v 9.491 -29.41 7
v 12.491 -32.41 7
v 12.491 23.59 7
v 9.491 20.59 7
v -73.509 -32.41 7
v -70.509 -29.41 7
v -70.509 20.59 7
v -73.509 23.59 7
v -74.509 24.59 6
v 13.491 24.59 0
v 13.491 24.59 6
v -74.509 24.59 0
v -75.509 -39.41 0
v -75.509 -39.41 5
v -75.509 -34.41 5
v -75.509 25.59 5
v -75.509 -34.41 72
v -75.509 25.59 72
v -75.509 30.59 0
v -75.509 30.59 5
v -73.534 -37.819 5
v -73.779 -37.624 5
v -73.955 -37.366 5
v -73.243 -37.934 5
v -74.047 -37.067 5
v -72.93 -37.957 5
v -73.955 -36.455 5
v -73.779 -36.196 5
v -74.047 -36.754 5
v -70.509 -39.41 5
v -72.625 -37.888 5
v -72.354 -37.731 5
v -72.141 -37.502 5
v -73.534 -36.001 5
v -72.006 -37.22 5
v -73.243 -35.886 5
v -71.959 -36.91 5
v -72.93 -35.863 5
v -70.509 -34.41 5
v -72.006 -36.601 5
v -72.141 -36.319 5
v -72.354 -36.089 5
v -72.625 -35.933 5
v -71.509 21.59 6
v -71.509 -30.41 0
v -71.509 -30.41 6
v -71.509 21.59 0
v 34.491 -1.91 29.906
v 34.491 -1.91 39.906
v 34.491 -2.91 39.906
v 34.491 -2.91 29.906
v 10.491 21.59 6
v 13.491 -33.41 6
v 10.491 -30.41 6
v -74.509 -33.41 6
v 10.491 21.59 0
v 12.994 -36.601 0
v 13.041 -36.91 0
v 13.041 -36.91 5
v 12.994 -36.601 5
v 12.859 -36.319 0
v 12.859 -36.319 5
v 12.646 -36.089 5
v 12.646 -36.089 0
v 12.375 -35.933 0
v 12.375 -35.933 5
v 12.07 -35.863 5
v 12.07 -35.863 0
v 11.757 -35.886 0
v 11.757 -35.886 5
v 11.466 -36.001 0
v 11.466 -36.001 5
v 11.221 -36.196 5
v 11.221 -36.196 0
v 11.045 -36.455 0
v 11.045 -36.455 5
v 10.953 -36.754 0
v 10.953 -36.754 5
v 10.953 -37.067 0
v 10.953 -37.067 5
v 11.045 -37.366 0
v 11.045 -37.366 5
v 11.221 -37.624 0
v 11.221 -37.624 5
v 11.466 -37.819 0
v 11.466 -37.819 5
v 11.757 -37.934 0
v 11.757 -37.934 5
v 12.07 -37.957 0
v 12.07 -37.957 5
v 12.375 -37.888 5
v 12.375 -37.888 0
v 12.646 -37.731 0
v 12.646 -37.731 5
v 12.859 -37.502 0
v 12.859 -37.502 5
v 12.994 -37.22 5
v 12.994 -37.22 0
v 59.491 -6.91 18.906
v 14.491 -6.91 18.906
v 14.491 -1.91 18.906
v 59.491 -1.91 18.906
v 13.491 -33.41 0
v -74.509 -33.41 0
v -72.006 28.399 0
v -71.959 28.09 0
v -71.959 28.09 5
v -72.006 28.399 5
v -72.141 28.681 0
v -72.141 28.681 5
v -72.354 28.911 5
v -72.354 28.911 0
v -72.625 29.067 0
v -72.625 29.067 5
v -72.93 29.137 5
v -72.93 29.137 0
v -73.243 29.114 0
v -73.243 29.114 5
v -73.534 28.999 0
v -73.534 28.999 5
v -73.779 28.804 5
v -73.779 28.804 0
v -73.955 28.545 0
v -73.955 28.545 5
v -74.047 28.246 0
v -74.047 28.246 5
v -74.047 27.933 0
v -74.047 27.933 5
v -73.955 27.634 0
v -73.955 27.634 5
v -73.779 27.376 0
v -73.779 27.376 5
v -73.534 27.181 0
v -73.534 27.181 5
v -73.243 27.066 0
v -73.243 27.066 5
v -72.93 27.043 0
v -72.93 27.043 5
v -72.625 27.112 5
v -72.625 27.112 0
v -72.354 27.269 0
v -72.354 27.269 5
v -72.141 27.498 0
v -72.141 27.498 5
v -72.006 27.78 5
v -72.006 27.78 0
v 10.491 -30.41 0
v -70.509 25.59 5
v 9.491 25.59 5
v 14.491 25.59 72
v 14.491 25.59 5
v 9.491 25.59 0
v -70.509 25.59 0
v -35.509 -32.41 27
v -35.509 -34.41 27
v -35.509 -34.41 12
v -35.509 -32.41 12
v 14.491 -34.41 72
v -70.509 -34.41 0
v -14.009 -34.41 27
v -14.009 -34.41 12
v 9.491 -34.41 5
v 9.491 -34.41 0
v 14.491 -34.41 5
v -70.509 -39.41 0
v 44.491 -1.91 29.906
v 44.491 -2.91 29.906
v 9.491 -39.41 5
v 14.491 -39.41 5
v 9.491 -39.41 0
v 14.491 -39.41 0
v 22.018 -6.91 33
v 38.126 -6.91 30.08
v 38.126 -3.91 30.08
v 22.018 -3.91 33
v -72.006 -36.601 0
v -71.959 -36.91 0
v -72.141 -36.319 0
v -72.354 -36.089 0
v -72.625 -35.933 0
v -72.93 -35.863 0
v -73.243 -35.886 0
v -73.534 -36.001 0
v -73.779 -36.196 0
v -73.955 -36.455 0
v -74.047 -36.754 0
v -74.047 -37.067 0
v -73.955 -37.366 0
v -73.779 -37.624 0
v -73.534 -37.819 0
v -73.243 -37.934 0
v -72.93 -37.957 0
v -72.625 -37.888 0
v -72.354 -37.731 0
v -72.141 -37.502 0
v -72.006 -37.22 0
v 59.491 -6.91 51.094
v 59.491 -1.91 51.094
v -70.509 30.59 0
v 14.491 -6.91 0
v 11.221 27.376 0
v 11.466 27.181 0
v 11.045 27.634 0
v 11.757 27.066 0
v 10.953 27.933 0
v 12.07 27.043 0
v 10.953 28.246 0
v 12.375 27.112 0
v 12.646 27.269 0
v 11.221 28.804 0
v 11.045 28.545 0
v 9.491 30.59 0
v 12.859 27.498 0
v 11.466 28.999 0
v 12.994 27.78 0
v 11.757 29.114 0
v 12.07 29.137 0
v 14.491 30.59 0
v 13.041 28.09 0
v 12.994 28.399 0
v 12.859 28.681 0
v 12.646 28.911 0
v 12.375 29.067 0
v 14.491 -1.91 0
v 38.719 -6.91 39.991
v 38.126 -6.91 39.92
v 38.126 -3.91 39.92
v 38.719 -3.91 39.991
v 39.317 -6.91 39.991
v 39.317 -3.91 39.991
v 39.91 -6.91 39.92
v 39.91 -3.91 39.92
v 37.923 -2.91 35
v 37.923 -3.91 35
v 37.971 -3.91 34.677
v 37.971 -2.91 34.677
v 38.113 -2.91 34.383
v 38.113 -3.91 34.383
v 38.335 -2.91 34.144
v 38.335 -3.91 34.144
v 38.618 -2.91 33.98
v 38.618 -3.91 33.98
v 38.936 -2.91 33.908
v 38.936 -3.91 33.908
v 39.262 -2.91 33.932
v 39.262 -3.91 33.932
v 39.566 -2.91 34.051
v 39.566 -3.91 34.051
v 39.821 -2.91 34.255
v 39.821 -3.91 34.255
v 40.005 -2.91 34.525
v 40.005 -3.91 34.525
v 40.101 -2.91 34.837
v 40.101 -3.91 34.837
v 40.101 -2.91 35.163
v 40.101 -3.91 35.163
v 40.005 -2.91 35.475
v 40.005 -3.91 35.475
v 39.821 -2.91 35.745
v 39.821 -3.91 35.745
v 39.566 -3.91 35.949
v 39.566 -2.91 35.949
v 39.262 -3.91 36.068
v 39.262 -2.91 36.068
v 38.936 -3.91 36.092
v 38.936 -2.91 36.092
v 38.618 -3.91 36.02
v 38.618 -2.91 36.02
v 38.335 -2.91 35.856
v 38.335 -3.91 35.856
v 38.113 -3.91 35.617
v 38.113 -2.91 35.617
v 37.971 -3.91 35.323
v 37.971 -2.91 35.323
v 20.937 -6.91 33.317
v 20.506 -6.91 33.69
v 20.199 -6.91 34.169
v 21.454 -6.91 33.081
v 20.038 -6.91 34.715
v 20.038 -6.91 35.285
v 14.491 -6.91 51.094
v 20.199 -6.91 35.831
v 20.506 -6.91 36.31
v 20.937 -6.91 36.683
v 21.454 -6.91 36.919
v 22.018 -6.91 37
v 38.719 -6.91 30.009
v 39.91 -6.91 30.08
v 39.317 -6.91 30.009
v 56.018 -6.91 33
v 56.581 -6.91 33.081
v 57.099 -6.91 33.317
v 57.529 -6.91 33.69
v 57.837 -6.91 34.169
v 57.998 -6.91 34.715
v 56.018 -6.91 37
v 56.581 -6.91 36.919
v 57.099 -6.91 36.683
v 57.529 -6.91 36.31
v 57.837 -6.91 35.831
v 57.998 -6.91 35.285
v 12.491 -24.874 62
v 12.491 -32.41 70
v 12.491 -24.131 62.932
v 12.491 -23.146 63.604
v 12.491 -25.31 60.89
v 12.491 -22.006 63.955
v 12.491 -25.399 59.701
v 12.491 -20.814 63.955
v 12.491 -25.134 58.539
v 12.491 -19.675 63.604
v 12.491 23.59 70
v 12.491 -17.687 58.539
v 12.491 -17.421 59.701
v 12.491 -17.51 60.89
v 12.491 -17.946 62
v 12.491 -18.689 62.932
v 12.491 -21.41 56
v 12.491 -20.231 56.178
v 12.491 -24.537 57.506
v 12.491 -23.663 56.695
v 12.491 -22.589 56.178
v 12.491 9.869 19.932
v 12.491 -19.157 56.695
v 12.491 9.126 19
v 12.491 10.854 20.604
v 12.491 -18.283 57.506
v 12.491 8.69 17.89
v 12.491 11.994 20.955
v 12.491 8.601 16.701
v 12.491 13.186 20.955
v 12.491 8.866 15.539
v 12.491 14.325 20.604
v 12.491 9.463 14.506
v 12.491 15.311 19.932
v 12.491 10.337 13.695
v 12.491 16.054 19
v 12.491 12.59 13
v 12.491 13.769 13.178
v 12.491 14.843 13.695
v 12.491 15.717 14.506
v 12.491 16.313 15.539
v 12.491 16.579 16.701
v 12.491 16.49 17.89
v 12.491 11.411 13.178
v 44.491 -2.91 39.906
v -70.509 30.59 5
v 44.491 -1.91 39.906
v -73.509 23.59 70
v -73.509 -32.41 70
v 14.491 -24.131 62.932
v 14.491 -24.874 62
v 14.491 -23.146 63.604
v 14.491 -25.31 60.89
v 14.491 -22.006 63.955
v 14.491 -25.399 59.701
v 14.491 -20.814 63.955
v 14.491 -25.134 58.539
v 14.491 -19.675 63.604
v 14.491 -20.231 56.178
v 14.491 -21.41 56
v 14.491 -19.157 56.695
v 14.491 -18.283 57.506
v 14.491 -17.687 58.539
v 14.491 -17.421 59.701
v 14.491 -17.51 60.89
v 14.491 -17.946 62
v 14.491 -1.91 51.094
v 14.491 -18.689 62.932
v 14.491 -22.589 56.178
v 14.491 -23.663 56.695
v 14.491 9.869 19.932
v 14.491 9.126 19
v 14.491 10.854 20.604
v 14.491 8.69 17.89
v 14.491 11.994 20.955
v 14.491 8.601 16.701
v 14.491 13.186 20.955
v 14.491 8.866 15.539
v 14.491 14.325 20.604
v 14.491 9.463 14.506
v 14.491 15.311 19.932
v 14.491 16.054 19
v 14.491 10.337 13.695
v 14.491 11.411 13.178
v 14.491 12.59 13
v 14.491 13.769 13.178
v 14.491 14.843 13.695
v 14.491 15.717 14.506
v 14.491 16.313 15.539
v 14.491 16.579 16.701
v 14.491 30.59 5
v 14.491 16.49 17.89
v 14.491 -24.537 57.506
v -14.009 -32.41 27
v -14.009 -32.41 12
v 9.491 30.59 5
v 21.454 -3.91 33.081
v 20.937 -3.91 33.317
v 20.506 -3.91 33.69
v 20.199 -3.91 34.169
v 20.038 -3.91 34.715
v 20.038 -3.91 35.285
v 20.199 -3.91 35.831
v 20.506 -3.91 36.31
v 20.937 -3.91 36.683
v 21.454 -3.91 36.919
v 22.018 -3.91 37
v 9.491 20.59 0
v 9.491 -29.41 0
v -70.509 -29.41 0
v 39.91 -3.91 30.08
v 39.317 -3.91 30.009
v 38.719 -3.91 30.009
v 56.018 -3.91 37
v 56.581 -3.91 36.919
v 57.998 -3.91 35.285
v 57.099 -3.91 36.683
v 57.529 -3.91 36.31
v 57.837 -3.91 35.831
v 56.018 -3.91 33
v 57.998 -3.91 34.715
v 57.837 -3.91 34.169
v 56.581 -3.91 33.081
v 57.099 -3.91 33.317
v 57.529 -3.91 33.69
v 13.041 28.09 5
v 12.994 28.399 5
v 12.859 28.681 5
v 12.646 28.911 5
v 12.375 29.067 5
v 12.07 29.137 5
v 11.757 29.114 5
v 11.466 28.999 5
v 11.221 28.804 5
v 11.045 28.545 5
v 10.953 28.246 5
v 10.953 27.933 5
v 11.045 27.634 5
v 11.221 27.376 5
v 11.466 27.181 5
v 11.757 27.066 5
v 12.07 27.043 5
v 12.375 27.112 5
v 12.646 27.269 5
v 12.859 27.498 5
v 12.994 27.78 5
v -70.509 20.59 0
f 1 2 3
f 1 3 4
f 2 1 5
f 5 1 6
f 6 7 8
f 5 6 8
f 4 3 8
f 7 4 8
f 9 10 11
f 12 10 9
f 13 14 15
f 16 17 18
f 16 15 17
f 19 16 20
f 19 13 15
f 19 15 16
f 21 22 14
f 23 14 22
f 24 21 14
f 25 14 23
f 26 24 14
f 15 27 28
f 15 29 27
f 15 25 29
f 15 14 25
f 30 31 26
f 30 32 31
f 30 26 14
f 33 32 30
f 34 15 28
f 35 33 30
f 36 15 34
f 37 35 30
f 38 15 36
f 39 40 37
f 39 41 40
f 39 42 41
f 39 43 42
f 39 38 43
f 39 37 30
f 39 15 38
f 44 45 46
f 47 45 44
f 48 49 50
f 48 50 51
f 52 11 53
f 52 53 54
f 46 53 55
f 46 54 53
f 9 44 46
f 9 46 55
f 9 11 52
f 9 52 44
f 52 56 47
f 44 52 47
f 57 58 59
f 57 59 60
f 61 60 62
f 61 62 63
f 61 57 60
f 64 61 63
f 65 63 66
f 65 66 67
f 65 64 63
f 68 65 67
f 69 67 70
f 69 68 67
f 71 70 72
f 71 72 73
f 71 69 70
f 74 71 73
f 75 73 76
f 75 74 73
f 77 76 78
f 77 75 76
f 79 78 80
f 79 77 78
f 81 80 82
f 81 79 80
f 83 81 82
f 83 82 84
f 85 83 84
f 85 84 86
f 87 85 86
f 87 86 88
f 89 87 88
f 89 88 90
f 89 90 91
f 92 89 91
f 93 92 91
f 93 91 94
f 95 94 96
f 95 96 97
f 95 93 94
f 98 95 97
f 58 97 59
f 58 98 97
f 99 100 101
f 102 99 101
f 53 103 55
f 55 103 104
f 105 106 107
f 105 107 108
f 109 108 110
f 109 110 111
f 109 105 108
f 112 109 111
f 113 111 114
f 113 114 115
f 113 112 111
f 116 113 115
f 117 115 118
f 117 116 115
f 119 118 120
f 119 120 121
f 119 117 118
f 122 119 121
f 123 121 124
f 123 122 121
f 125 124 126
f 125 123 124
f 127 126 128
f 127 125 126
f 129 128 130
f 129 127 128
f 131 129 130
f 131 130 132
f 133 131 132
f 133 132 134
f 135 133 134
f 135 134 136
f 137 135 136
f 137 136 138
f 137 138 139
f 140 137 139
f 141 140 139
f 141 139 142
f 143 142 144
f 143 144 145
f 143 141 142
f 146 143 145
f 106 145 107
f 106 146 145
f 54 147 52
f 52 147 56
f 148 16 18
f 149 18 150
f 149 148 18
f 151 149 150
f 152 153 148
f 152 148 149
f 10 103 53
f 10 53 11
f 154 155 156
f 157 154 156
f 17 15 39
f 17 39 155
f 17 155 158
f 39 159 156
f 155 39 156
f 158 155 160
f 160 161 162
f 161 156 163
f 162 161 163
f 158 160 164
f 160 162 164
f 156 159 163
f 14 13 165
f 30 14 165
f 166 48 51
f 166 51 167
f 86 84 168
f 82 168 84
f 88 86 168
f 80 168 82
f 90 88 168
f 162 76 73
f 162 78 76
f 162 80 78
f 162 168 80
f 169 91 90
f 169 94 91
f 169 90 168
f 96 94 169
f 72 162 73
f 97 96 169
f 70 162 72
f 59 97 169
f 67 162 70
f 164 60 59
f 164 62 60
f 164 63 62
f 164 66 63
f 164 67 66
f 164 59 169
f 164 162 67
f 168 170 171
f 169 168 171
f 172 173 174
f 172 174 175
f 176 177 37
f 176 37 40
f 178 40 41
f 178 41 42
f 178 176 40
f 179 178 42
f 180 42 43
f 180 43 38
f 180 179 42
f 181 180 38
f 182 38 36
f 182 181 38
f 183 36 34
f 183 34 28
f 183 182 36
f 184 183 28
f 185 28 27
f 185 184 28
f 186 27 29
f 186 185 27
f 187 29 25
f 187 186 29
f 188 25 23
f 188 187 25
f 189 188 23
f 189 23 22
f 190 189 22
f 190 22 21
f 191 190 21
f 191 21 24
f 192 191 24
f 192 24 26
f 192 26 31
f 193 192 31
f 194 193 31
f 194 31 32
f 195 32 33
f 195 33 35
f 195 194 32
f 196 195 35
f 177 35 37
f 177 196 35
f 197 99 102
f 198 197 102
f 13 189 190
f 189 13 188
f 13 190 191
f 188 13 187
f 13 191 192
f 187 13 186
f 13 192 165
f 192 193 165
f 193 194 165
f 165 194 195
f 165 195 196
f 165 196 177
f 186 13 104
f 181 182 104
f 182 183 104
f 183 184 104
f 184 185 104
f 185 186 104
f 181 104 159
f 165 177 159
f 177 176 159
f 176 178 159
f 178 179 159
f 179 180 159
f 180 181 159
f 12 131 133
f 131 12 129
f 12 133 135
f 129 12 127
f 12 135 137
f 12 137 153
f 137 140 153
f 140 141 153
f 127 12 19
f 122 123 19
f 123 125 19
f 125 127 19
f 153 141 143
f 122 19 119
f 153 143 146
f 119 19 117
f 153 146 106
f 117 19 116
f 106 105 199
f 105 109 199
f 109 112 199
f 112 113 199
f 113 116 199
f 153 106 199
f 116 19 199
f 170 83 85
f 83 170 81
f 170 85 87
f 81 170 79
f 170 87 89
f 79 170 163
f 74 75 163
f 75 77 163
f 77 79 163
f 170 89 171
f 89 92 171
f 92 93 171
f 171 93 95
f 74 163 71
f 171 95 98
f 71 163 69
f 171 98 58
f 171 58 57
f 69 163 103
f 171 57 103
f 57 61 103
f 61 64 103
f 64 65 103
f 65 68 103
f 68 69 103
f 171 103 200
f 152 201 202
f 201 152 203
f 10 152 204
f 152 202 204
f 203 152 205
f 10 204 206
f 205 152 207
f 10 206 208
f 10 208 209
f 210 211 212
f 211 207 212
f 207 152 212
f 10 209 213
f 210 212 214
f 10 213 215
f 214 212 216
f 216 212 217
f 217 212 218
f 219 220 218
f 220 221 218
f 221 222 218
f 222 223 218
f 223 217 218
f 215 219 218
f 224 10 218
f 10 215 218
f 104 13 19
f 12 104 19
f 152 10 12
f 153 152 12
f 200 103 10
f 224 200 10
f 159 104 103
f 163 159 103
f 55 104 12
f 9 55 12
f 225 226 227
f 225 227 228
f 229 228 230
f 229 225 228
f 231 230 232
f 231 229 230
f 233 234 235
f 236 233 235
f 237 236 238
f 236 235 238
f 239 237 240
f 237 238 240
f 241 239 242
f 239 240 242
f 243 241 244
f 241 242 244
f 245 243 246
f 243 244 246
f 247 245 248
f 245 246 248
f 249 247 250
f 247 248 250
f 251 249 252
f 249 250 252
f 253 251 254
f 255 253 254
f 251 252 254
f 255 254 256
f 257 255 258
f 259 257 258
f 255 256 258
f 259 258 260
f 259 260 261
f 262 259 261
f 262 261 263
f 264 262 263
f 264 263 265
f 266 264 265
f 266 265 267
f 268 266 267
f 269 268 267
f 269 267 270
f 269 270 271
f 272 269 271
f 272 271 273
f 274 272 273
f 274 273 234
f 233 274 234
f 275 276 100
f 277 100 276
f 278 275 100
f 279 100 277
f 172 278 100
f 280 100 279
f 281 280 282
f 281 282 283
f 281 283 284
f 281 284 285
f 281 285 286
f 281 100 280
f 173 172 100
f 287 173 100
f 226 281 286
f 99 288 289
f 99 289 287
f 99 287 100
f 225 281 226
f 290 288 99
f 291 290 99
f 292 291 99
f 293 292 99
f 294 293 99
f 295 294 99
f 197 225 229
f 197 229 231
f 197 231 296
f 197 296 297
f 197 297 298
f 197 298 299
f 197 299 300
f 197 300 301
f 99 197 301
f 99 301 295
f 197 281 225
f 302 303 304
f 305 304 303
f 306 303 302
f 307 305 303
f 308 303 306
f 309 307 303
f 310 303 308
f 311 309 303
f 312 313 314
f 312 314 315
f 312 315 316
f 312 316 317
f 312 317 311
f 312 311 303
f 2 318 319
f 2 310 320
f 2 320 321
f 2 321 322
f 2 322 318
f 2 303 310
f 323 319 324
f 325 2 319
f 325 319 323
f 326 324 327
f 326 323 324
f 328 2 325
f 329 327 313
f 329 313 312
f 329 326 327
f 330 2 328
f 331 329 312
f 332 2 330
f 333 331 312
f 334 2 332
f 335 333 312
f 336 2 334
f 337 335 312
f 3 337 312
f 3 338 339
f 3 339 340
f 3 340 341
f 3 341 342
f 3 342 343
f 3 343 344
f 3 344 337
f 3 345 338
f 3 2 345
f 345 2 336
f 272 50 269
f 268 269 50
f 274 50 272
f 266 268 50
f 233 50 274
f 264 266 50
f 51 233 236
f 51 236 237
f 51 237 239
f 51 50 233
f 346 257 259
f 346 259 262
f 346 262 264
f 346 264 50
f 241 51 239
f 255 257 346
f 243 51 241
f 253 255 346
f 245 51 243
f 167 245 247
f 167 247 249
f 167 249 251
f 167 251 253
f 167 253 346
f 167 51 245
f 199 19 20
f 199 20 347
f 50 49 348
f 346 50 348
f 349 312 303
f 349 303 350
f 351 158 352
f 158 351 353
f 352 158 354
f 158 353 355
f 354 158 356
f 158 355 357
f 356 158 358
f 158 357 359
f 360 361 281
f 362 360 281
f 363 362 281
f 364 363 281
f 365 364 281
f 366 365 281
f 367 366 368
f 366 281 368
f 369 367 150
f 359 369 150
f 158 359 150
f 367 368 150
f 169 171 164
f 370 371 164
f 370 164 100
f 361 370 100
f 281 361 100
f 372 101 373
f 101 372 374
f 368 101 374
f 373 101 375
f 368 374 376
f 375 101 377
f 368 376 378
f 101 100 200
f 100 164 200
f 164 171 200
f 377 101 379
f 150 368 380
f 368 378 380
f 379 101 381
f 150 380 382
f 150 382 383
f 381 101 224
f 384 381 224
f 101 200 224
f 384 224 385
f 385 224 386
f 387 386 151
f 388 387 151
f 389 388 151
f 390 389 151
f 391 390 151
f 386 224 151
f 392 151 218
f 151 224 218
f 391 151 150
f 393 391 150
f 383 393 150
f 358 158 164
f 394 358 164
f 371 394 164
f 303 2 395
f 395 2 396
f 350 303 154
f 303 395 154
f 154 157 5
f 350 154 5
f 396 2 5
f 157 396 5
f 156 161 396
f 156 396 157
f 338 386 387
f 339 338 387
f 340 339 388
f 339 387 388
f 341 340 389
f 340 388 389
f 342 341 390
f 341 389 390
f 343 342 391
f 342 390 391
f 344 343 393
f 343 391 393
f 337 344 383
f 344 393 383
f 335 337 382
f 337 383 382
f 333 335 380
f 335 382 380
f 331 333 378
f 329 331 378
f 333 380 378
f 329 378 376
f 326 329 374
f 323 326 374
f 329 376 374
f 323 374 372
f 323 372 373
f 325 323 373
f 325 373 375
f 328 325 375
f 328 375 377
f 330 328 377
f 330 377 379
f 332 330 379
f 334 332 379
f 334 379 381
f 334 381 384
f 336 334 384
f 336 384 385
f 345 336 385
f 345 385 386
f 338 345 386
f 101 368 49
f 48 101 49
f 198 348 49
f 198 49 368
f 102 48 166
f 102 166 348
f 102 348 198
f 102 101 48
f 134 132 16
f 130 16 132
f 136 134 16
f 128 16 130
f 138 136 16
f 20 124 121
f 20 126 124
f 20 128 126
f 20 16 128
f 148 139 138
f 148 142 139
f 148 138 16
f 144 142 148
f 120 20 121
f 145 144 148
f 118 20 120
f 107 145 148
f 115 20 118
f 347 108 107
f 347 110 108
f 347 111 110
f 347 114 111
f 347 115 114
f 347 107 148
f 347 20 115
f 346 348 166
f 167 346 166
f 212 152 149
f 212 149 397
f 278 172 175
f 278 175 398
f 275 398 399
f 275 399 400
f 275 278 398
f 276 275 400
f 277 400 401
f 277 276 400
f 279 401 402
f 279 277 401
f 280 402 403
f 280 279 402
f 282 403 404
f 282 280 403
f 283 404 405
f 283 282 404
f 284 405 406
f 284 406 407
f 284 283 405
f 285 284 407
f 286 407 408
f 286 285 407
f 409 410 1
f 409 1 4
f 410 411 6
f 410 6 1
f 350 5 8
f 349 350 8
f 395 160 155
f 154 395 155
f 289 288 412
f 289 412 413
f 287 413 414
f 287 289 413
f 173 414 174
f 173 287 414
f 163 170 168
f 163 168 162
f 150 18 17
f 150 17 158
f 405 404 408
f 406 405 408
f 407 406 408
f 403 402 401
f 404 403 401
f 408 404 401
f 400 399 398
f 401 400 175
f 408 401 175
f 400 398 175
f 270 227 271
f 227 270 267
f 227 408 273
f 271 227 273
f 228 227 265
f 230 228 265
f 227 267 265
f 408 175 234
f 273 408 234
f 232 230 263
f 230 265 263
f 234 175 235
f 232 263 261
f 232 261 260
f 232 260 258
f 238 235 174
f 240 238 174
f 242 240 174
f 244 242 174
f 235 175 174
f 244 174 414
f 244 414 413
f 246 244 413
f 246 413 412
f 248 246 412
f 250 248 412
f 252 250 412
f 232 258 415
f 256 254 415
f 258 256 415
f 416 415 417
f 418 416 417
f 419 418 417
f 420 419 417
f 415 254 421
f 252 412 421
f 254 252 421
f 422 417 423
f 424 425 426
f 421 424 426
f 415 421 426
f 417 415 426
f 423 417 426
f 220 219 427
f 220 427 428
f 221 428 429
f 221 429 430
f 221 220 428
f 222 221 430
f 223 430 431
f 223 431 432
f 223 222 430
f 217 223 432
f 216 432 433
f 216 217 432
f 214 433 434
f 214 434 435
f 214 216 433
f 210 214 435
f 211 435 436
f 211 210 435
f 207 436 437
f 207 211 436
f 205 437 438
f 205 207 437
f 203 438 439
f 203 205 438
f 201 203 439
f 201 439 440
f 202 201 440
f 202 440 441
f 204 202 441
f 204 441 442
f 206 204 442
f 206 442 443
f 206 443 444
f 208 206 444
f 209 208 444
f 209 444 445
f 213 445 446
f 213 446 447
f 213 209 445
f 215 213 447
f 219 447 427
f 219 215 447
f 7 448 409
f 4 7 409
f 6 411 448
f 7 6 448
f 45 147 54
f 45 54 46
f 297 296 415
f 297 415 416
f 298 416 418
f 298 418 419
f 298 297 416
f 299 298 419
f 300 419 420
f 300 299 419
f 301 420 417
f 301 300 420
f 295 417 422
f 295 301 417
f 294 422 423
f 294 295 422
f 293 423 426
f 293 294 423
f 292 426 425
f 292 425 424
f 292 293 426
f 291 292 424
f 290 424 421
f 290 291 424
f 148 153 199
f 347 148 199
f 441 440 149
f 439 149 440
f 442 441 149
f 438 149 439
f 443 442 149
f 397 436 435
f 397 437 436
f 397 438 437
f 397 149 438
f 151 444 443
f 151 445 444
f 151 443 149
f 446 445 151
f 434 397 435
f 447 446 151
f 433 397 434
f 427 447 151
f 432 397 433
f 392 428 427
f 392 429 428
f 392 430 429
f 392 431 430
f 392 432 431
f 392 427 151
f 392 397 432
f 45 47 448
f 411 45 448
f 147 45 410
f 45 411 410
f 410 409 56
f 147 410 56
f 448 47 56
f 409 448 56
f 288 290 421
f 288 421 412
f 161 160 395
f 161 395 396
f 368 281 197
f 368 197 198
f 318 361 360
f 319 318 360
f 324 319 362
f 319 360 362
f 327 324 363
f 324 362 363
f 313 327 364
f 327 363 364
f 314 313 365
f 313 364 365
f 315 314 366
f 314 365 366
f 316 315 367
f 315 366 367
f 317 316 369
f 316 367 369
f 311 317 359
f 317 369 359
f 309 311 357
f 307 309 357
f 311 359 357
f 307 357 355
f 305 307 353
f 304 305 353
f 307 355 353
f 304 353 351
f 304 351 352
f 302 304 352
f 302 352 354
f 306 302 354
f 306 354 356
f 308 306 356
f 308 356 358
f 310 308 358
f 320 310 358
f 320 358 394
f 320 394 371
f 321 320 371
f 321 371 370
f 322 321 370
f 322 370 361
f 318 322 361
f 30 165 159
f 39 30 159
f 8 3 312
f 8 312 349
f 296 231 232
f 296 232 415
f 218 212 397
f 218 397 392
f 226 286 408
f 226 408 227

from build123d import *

# Parameters (mm, degrees)
SKETCH_1_W           = 135
SKETCH_1_H           = 60
EXTRUDE_1_DEPTH      = 70
SKETCH_6_W           = 45
SKETCH_6_H           = 70
CUT_EXTRUDE_1_DEPTH  = 27.5
SKETCH_5_W           = 45
SKETCH_5_H           = 70
CUT_EXTRUDE_2_DEPTH  = 27.5
SKETCH_7_W           = 80
SKETCH_7_H           = 50
CUT_EXTRUDE_3_DEPTH  = 75
SKETCH_8_W           = 88
SKETCH_8_H           = 58
SKETCH_8_W_2         = 82
SKETCH_8_H_2         = 52
CUT_EXTRUDE_4_DEPTH  = 6
SKETCH_10_W          = 21.5
SKETCH_10_H          = 15
CUT_EXTRUDE_6_DEPTH  = 10
SKETCH_12_W          = 18.906228009
SKETCH_12_H          = 10
CUT_EXTRUDE_7_DEPTH  = 45
CUT_EXTRUDE_8_DEPTH  = 3
SKETCH_15_W          = 10
SKETCH_15_H          = 10
CUT_EXTRUDE_9_DEPTH  = 1
SKETCH_17_R          = 1.095275866
CUT_EXTRUDE_11_DEPTH = 7
SKETCH_18_W          = 5
SKETCH_18_H          = 5
SKETCH_18_R          = 1.05
EXTRUDE_2_DEPTH      = 5
SKETCH_19_W          = 90
SKETCH_19_H          = 60
EXTRUDE_3_DEPTH      = 2
SKETCH_20_R          = 4
CUT_EXTRUDE_12_DEPTH = 10
SKETCH_21_W          = 86
SKETCH_21_H          = 56
CUT_EXTRUDE_13_DEPTH = 63


with BuildPart() as part:
    # 草圖1 → 填料-伸長1 (new body)
    with BuildSketch(Plane.XY):
        with Locations((-8.008902174, -4.41011236)):
            Rectangle(SKETCH_1_W, SKETCH_1_H)
    extrude(amount=EXTRUDE_1_DEPTH)

    # 草圖6 → 除料-伸長1 (cut)
    with BuildSketch(Plane(origin=(0, 25.58988764, 0), x_dir=(1, 0, 0), z_dir=(0, 1, 0))):
        with Locations((36.991097826, -35)):
            Rectangle(SKETCH_6_W, SKETCH_6_H)
    extrude(amount=-CUT_EXTRUDE_1_DEPTH, mode=Mode.SUBTRACT)

    # 草圖5 → 除料-伸長2 (cut)
    with BuildSketch(Plane.XZ.offset(34.41011236)):
        with Locations((36.991097826, 35)):
            Rectangle(SKETCH_5_W, SKETCH_5_H)
    extrude(amount=-CUT_EXTRUDE_2_DEPTH, mode=Mode.SUBTRACT)

    # 草圖7 → 除料-伸長3 (cut)
    with BuildSketch(Plane.XY):
        with Locations((-30.508902174, -4.41011236)):
            Rectangle(SKETCH_7_W, SKETCH_7_H)
    extrude(amount=CUT_EXTRUDE_3_DEPTH, mode=Mode.SUBTRACT)

    # 草圖8 → 除料-伸長4 (cut)
    with BuildSketch(Plane(origin=(0, 0, 0), x_dir=(-1, 0, 0), z_dir=(0, 0, -1))):
        with Locations((30.508902174, -4.41011236)):
            Rectangle(SKETCH_8_W, SKETCH_8_H)
        with Locations((30.508902174, -4.41011236)):
            Rectangle(SKETCH_8_W_2, SKETCH_8_H_2, mode=Mode.SUBTRACT)
    extrude(amount=-CUT_EXTRUDE_4_DEPTH, mode=Mode.SUBTRACT)

    # 草圖10 → 除料-伸長6 (cut)
    with BuildSketch(Plane(origin=(0, -34.41011236, 0), x_dir=(-1, 0, 0), z_dir=(0, -1, 0))):
        with Locations((24.758902174, -19.5)):
            Rectangle(SKETCH_10_W, SKETCH_10_H)
    extrude(amount=-CUT_EXTRUDE_6_DEPTH, mode=Mode.SUBTRACT)

    # 草圖12 → 除料-伸長7 (cut)
    with BuildSketch(Plane(origin=(14.491097826, 0, 0), x_dir=(0, 0, -1), z_dir=(1, 0, 0))):
        with Locations((-60.546885996, -4.41011236)):
            Rectangle(SKETCH_12_W, SKETCH_12_H)
        with Locations((-9.453114004, -4.41011236)):
            Rectangle(SKETCH_12_W, SKETCH_12_H)
    extrude(amount=CUT_EXTRUDE_7_DEPTH, mode=Mode.SUBTRACT)

    # 草圖14 → 除料-伸長8 (cut)
    with BuildSketch(Plane(origin=(0, -6.91011236, 0), x_dir=(-1, 0, 0), z_dir=(0, -1, 0))):
        with BuildLine():
            Line((-38.126130034, -30.080170747), (-22.017914827, -33))
            ThreePointArc((-22.017914827, -33), (-20.017914827, -35), (-22.017914827, -37))
            Line((-22.017914827, -37), (-38.126130034, -39.919829253))
            ThreePointArc((-38.126130034, -39.919829253), (-39.017914827, -40), (-39.909699621, -39.919829253))
            Line((-39.909699621, -39.919829253), (-56.017914827, -37))
            ThreePointArc((-56.017914827, -37), (-58.017914827, -35), (-56.017914827, -33))
            Line((-56.017914827, -33), (-39.909699621, -30.080170747))
            ThreePointArc((-39.909699621, -30.080170747), (-39.017914827, -30), (-38.126130034, -30.080170747))
        make_face()
    extrude(amount=-CUT_EXTRUDE_8_DEPTH, mode=Mode.SUBTRACT)

    # 草圖15 → 除料-伸長9 (cut)
    with BuildSketch(Plane(origin=(0, -1.91011236, 0), x_dir=(1, 0, 0), z_dir=(0, 1, 0))):
        with Locations((39.491097826, -34.906228009)):
            Rectangle(SKETCH_15_W, SKETCH_15_H)
    extrude(amount=-CUT_EXTRUDE_9_DEPTH, mode=Mode.SUBTRACT)

    # 草圖17 → 除料-伸長11 (cut)
    with BuildSketch(Plane(origin=(0, -6.91011236, 0), x_dir=(-1, 0, 0), z_dir=(0, -1, 0))):
        with Locations((-39.017914827, -35)):
            Circle(SKETCH_17_R)
    extrude(amount=-CUT_EXTRUDE_11_DEPTH, mode=Mode.SUBTRACT)

    # 草圖18 → 填料-伸長2 (add)
    with BuildSketch(Plane.XY):
        with Locations((11.991097826, 28.08988764)):
            Rectangle(SKETCH_18_W, SKETCH_18_H)
        with Locations((11.991097826, 28.08988764)):
            Circle(SKETCH_18_R, mode=Mode.SUBTRACT)
        with Locations((-73.008902174, 28.08988764)):
            Rectangle(SKETCH_18_W, SKETCH_18_H)
        with Locations((-73.008902174, 28.08988764)):
            Circle(SKETCH_18_R, mode=Mode.SUBTRACT)
        with Locations((-73.008902174, -36.91011236)):
            Rectangle(SKETCH_18_W, SKETCH_18_H)
        with Locations((-73.008902174, -36.91011236)):
            Circle(SKETCH_18_R, mode=Mode.SUBTRACT)
        with Locations((11.991097826, -36.91011236)):
            Rectangle(SKETCH_18_W, SKETCH_18_H)
        with Locations((11.991097826, -36.91011236)):
            Circle(SKETCH_18_R, mode=Mode.SUBTRACT)
    extrude(amount=EXTRUDE_2_DEPTH)

    # 草圖19 → 填料-伸長3 (add)
    with BuildSketch(Plane.XY.offset(70)):
        with Locations((-30.508902174, -4.41011236)):
            Rectangle(SKETCH_19_W, SKETCH_19_H)
    extrude(amount=EXTRUDE_3_DEPTH)

    # 草圖20 → 除料-伸長12 (cut)
    with BuildSketch(Plane(origin=(14.491097826, 0, 0), x_dir=(0, 0, -1), z_dir=(1, 0, 0))):
        with Locations((-60, -21.41011236)):
            Circle(SKETCH_20_R)
        with Locations((-17, 12.58988764)):
            Circle(SKETCH_20_R)
    extrude(amount=-CUT_EXTRUDE_12_DEPTH, mode=Mode.SUBTRACT)

    # 草圖21 → 除料-伸長13 (cut)
    with BuildSketch(Plane(origin=(0, 0, 7), x_dir=(-1, 0, 0), z_dir=(0, 0, -1))):
        with Locations((30.508902174, -4.41011236)):
            Rectangle(SKETCH_21_W, SKETCH_21_H)
    extrude(amount=-CUT_EXTRUDE_13_DEPTH, mode=Mode.SUBTRACT)


solid = part.part
